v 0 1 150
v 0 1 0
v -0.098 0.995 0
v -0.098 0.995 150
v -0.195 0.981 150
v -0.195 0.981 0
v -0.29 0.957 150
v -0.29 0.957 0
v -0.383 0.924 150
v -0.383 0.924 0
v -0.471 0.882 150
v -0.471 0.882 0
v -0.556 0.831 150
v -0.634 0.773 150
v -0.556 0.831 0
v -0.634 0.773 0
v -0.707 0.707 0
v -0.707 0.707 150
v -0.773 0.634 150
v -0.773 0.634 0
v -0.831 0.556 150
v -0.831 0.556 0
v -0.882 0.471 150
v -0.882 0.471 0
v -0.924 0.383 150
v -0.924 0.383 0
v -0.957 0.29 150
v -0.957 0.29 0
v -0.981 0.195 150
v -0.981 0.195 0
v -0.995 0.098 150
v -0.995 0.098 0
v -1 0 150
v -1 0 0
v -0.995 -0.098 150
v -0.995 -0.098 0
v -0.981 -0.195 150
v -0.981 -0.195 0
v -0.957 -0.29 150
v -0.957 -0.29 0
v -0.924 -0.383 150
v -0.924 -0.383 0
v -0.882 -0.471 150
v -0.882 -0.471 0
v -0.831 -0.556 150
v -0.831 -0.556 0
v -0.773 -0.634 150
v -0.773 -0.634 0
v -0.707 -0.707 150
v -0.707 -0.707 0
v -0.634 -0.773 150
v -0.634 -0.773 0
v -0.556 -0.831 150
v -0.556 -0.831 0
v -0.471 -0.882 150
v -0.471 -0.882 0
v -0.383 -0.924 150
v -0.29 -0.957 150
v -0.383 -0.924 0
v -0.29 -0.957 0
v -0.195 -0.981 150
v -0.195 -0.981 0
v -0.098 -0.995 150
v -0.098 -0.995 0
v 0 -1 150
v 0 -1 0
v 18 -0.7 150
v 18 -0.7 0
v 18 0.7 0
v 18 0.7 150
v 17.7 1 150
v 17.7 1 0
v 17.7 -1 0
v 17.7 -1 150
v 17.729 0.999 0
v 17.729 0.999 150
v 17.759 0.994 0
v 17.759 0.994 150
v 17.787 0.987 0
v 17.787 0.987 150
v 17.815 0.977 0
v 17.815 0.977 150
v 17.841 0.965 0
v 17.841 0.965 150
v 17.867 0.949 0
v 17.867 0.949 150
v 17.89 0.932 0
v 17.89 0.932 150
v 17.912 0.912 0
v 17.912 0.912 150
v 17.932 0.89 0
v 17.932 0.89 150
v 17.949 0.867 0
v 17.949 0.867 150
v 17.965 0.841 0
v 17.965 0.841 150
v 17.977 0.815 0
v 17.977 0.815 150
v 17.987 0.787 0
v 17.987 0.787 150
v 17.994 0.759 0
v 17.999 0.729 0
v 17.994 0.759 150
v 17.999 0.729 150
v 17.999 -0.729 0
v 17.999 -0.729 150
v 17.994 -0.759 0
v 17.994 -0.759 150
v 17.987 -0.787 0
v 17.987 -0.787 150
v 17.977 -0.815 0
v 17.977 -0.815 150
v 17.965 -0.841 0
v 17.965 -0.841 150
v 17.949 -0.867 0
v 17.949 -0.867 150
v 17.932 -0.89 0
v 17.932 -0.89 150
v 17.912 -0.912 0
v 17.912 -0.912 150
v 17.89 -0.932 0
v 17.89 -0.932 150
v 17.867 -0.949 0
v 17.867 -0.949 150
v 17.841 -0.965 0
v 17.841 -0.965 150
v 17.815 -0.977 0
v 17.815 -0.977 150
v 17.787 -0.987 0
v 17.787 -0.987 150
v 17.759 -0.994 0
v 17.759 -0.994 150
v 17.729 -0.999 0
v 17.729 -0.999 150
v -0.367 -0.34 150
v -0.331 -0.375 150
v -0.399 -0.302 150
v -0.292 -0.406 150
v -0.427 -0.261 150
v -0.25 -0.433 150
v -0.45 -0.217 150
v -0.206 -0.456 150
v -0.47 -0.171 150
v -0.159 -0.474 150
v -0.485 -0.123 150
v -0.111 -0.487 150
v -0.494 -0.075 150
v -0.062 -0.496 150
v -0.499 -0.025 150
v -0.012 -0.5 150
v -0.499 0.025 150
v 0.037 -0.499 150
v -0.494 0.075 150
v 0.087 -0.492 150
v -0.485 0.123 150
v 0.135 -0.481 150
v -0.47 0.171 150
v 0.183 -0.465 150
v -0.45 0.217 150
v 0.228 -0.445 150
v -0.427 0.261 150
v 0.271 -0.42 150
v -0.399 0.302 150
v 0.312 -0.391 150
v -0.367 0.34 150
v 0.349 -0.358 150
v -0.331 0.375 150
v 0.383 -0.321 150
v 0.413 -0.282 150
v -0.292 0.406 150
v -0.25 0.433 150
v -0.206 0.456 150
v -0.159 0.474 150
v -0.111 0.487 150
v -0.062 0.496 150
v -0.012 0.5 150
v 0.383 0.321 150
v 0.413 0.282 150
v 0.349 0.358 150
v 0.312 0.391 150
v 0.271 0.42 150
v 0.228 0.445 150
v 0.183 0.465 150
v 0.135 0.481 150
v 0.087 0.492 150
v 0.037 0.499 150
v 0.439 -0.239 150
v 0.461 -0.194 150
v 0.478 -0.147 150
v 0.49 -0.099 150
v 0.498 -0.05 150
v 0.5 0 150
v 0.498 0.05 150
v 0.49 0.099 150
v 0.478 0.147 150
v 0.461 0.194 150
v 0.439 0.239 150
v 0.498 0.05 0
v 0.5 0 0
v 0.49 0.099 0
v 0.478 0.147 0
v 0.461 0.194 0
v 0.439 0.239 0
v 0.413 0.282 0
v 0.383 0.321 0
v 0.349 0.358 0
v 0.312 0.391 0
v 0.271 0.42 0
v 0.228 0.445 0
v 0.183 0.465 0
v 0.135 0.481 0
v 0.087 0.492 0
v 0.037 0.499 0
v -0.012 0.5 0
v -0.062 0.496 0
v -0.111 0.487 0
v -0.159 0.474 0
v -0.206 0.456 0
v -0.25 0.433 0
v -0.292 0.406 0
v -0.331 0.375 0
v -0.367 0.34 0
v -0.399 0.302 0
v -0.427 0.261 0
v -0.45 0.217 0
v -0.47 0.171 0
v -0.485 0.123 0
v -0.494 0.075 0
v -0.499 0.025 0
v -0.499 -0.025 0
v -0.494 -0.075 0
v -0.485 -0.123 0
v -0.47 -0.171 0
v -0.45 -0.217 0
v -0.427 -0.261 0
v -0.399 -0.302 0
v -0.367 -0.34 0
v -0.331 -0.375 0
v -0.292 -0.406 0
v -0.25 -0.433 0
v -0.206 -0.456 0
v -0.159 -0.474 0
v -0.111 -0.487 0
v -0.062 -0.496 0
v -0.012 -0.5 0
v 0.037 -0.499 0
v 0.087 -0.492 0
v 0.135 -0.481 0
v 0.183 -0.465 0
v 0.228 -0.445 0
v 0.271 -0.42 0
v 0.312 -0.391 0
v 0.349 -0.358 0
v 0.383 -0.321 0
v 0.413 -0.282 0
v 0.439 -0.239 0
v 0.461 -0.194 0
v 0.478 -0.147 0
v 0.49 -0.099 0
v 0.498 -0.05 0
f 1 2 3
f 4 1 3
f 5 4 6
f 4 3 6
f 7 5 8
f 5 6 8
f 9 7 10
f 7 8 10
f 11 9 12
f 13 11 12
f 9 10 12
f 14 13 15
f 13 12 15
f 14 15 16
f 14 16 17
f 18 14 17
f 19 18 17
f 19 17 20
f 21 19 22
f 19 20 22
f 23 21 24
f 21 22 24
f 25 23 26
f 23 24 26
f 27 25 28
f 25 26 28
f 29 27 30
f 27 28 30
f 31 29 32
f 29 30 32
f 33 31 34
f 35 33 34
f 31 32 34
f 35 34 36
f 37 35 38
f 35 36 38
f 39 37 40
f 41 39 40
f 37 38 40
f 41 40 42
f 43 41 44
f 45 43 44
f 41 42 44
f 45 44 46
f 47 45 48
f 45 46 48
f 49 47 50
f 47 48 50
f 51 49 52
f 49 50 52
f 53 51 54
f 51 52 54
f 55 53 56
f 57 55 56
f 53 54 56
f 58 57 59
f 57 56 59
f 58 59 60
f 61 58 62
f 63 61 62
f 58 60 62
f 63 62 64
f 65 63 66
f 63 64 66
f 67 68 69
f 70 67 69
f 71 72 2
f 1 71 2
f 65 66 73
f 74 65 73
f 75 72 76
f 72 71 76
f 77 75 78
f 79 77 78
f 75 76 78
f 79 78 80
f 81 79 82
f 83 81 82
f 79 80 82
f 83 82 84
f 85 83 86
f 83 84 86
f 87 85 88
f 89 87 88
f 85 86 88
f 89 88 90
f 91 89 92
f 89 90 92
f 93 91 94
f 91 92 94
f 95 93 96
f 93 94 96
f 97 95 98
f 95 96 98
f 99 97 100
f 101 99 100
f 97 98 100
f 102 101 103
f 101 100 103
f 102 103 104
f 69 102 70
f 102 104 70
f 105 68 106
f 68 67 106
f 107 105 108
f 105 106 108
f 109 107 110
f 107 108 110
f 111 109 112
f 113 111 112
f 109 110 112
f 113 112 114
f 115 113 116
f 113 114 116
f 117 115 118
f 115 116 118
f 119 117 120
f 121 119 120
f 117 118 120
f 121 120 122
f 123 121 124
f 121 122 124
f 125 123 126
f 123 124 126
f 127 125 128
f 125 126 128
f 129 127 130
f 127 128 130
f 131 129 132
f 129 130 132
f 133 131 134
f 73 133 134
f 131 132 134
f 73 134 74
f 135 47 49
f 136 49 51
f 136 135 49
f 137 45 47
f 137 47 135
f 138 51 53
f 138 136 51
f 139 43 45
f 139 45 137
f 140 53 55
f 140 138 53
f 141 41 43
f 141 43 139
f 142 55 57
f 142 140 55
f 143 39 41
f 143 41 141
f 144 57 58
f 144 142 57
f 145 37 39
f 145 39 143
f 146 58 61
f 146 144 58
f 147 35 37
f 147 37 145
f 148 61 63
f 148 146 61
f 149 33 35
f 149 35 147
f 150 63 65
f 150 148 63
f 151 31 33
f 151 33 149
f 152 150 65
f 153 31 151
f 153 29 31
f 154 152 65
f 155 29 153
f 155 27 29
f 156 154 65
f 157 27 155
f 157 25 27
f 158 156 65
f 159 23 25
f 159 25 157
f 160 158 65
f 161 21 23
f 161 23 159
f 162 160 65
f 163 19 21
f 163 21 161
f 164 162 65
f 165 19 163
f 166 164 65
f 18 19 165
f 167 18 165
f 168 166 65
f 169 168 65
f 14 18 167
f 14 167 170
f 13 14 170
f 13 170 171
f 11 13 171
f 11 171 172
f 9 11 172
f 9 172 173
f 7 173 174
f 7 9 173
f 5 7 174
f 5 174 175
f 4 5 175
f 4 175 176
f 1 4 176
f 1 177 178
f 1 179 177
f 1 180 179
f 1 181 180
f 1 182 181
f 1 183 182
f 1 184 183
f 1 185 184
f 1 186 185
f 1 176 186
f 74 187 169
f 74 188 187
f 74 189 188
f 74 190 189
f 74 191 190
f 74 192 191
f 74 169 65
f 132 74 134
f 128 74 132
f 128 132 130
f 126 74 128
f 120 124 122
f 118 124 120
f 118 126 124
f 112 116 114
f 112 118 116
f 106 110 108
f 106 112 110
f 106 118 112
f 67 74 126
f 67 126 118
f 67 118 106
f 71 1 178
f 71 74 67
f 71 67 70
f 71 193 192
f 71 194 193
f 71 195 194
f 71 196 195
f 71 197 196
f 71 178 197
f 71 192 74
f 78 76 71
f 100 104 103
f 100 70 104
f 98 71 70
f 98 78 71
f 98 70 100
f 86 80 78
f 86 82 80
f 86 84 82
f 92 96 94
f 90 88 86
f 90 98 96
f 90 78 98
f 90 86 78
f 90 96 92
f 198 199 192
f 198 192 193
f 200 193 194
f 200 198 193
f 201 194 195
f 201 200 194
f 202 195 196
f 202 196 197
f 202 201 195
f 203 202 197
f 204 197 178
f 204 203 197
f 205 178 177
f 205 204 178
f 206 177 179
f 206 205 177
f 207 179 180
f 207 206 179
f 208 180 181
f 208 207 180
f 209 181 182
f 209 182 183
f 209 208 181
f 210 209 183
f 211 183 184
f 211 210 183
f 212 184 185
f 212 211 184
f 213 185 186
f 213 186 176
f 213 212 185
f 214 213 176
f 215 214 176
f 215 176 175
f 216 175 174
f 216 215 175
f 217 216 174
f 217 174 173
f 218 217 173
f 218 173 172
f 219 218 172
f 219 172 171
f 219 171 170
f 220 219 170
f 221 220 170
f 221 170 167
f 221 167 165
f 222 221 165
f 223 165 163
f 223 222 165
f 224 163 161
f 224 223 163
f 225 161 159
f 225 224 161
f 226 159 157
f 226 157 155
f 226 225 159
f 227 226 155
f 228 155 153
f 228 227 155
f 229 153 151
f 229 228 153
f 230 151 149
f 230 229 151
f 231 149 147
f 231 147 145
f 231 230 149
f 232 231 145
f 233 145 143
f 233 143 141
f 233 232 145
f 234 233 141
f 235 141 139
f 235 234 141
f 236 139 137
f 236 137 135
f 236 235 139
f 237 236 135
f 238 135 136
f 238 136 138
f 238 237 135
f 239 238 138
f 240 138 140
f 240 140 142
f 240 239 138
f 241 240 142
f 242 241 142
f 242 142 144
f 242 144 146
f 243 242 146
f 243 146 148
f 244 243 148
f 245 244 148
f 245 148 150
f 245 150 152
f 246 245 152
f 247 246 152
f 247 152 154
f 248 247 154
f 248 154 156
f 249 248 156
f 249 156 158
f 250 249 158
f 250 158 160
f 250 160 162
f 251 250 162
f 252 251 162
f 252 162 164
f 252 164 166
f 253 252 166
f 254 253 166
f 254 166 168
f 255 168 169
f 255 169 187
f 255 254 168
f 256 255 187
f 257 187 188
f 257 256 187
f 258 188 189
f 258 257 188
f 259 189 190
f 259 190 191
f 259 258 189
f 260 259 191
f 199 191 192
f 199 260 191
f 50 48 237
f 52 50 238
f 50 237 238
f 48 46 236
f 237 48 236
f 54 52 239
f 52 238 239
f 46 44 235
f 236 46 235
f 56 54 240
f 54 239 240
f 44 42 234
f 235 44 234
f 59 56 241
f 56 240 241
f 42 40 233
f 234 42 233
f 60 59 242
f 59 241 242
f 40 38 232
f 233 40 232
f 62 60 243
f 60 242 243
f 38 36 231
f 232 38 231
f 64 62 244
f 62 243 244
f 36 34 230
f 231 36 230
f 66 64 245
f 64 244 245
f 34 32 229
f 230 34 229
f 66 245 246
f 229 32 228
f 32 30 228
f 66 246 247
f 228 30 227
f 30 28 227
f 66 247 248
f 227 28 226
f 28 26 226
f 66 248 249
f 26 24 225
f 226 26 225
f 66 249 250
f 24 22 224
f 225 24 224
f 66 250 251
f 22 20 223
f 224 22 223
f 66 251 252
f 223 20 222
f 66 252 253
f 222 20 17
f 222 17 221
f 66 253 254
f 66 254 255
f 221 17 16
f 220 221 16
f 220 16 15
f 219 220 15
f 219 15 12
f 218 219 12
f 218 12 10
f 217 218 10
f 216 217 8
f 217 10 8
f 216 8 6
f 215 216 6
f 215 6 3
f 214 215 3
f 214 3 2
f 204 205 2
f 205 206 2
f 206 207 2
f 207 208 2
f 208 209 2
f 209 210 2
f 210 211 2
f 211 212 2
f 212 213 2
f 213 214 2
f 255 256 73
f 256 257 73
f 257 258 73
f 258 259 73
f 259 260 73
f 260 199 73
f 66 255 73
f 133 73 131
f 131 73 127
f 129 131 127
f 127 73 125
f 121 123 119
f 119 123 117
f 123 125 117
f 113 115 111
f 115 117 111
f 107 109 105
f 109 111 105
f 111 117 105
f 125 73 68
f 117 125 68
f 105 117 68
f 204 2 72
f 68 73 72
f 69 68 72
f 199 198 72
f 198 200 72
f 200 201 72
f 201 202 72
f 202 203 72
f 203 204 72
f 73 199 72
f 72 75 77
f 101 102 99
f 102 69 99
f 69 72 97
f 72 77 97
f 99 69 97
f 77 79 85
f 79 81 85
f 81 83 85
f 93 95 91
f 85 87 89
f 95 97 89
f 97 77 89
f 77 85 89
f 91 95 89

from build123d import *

# Parameters (mm, degrees)
SKETCH_1_R      = 0.5
EXTRUDE_1_DEPTH = 150
FILLET_1_R      = 0.3


with BuildPart() as part:
    # 草图1 → 凸台-拉伸1 (new body)
    with BuildSketch(Plane.XY):
        with BuildLine():
            Line((18, 1), (0, 1))
            ThreePointArc((0, 1), (-1, 0), (0, -1))
            Line((0, -1), (18, -1))
            Line((18, -1), (18, 1))
        make_face()
        Circle(SKETCH_1_R, mode=Mode.SUBTRACT)
    extrude(amount=EXTRUDE_1_DEPTH)

    # 圆角1
    fillet_1_edges = [part.edges().sort_by_distance(p)[0] for p in [
        (18, 1, 75),
        (18, -1, 75),
    ]]
    fillet(fillet_1_edges, radius=FILLET_1_R)


solid = part.part
